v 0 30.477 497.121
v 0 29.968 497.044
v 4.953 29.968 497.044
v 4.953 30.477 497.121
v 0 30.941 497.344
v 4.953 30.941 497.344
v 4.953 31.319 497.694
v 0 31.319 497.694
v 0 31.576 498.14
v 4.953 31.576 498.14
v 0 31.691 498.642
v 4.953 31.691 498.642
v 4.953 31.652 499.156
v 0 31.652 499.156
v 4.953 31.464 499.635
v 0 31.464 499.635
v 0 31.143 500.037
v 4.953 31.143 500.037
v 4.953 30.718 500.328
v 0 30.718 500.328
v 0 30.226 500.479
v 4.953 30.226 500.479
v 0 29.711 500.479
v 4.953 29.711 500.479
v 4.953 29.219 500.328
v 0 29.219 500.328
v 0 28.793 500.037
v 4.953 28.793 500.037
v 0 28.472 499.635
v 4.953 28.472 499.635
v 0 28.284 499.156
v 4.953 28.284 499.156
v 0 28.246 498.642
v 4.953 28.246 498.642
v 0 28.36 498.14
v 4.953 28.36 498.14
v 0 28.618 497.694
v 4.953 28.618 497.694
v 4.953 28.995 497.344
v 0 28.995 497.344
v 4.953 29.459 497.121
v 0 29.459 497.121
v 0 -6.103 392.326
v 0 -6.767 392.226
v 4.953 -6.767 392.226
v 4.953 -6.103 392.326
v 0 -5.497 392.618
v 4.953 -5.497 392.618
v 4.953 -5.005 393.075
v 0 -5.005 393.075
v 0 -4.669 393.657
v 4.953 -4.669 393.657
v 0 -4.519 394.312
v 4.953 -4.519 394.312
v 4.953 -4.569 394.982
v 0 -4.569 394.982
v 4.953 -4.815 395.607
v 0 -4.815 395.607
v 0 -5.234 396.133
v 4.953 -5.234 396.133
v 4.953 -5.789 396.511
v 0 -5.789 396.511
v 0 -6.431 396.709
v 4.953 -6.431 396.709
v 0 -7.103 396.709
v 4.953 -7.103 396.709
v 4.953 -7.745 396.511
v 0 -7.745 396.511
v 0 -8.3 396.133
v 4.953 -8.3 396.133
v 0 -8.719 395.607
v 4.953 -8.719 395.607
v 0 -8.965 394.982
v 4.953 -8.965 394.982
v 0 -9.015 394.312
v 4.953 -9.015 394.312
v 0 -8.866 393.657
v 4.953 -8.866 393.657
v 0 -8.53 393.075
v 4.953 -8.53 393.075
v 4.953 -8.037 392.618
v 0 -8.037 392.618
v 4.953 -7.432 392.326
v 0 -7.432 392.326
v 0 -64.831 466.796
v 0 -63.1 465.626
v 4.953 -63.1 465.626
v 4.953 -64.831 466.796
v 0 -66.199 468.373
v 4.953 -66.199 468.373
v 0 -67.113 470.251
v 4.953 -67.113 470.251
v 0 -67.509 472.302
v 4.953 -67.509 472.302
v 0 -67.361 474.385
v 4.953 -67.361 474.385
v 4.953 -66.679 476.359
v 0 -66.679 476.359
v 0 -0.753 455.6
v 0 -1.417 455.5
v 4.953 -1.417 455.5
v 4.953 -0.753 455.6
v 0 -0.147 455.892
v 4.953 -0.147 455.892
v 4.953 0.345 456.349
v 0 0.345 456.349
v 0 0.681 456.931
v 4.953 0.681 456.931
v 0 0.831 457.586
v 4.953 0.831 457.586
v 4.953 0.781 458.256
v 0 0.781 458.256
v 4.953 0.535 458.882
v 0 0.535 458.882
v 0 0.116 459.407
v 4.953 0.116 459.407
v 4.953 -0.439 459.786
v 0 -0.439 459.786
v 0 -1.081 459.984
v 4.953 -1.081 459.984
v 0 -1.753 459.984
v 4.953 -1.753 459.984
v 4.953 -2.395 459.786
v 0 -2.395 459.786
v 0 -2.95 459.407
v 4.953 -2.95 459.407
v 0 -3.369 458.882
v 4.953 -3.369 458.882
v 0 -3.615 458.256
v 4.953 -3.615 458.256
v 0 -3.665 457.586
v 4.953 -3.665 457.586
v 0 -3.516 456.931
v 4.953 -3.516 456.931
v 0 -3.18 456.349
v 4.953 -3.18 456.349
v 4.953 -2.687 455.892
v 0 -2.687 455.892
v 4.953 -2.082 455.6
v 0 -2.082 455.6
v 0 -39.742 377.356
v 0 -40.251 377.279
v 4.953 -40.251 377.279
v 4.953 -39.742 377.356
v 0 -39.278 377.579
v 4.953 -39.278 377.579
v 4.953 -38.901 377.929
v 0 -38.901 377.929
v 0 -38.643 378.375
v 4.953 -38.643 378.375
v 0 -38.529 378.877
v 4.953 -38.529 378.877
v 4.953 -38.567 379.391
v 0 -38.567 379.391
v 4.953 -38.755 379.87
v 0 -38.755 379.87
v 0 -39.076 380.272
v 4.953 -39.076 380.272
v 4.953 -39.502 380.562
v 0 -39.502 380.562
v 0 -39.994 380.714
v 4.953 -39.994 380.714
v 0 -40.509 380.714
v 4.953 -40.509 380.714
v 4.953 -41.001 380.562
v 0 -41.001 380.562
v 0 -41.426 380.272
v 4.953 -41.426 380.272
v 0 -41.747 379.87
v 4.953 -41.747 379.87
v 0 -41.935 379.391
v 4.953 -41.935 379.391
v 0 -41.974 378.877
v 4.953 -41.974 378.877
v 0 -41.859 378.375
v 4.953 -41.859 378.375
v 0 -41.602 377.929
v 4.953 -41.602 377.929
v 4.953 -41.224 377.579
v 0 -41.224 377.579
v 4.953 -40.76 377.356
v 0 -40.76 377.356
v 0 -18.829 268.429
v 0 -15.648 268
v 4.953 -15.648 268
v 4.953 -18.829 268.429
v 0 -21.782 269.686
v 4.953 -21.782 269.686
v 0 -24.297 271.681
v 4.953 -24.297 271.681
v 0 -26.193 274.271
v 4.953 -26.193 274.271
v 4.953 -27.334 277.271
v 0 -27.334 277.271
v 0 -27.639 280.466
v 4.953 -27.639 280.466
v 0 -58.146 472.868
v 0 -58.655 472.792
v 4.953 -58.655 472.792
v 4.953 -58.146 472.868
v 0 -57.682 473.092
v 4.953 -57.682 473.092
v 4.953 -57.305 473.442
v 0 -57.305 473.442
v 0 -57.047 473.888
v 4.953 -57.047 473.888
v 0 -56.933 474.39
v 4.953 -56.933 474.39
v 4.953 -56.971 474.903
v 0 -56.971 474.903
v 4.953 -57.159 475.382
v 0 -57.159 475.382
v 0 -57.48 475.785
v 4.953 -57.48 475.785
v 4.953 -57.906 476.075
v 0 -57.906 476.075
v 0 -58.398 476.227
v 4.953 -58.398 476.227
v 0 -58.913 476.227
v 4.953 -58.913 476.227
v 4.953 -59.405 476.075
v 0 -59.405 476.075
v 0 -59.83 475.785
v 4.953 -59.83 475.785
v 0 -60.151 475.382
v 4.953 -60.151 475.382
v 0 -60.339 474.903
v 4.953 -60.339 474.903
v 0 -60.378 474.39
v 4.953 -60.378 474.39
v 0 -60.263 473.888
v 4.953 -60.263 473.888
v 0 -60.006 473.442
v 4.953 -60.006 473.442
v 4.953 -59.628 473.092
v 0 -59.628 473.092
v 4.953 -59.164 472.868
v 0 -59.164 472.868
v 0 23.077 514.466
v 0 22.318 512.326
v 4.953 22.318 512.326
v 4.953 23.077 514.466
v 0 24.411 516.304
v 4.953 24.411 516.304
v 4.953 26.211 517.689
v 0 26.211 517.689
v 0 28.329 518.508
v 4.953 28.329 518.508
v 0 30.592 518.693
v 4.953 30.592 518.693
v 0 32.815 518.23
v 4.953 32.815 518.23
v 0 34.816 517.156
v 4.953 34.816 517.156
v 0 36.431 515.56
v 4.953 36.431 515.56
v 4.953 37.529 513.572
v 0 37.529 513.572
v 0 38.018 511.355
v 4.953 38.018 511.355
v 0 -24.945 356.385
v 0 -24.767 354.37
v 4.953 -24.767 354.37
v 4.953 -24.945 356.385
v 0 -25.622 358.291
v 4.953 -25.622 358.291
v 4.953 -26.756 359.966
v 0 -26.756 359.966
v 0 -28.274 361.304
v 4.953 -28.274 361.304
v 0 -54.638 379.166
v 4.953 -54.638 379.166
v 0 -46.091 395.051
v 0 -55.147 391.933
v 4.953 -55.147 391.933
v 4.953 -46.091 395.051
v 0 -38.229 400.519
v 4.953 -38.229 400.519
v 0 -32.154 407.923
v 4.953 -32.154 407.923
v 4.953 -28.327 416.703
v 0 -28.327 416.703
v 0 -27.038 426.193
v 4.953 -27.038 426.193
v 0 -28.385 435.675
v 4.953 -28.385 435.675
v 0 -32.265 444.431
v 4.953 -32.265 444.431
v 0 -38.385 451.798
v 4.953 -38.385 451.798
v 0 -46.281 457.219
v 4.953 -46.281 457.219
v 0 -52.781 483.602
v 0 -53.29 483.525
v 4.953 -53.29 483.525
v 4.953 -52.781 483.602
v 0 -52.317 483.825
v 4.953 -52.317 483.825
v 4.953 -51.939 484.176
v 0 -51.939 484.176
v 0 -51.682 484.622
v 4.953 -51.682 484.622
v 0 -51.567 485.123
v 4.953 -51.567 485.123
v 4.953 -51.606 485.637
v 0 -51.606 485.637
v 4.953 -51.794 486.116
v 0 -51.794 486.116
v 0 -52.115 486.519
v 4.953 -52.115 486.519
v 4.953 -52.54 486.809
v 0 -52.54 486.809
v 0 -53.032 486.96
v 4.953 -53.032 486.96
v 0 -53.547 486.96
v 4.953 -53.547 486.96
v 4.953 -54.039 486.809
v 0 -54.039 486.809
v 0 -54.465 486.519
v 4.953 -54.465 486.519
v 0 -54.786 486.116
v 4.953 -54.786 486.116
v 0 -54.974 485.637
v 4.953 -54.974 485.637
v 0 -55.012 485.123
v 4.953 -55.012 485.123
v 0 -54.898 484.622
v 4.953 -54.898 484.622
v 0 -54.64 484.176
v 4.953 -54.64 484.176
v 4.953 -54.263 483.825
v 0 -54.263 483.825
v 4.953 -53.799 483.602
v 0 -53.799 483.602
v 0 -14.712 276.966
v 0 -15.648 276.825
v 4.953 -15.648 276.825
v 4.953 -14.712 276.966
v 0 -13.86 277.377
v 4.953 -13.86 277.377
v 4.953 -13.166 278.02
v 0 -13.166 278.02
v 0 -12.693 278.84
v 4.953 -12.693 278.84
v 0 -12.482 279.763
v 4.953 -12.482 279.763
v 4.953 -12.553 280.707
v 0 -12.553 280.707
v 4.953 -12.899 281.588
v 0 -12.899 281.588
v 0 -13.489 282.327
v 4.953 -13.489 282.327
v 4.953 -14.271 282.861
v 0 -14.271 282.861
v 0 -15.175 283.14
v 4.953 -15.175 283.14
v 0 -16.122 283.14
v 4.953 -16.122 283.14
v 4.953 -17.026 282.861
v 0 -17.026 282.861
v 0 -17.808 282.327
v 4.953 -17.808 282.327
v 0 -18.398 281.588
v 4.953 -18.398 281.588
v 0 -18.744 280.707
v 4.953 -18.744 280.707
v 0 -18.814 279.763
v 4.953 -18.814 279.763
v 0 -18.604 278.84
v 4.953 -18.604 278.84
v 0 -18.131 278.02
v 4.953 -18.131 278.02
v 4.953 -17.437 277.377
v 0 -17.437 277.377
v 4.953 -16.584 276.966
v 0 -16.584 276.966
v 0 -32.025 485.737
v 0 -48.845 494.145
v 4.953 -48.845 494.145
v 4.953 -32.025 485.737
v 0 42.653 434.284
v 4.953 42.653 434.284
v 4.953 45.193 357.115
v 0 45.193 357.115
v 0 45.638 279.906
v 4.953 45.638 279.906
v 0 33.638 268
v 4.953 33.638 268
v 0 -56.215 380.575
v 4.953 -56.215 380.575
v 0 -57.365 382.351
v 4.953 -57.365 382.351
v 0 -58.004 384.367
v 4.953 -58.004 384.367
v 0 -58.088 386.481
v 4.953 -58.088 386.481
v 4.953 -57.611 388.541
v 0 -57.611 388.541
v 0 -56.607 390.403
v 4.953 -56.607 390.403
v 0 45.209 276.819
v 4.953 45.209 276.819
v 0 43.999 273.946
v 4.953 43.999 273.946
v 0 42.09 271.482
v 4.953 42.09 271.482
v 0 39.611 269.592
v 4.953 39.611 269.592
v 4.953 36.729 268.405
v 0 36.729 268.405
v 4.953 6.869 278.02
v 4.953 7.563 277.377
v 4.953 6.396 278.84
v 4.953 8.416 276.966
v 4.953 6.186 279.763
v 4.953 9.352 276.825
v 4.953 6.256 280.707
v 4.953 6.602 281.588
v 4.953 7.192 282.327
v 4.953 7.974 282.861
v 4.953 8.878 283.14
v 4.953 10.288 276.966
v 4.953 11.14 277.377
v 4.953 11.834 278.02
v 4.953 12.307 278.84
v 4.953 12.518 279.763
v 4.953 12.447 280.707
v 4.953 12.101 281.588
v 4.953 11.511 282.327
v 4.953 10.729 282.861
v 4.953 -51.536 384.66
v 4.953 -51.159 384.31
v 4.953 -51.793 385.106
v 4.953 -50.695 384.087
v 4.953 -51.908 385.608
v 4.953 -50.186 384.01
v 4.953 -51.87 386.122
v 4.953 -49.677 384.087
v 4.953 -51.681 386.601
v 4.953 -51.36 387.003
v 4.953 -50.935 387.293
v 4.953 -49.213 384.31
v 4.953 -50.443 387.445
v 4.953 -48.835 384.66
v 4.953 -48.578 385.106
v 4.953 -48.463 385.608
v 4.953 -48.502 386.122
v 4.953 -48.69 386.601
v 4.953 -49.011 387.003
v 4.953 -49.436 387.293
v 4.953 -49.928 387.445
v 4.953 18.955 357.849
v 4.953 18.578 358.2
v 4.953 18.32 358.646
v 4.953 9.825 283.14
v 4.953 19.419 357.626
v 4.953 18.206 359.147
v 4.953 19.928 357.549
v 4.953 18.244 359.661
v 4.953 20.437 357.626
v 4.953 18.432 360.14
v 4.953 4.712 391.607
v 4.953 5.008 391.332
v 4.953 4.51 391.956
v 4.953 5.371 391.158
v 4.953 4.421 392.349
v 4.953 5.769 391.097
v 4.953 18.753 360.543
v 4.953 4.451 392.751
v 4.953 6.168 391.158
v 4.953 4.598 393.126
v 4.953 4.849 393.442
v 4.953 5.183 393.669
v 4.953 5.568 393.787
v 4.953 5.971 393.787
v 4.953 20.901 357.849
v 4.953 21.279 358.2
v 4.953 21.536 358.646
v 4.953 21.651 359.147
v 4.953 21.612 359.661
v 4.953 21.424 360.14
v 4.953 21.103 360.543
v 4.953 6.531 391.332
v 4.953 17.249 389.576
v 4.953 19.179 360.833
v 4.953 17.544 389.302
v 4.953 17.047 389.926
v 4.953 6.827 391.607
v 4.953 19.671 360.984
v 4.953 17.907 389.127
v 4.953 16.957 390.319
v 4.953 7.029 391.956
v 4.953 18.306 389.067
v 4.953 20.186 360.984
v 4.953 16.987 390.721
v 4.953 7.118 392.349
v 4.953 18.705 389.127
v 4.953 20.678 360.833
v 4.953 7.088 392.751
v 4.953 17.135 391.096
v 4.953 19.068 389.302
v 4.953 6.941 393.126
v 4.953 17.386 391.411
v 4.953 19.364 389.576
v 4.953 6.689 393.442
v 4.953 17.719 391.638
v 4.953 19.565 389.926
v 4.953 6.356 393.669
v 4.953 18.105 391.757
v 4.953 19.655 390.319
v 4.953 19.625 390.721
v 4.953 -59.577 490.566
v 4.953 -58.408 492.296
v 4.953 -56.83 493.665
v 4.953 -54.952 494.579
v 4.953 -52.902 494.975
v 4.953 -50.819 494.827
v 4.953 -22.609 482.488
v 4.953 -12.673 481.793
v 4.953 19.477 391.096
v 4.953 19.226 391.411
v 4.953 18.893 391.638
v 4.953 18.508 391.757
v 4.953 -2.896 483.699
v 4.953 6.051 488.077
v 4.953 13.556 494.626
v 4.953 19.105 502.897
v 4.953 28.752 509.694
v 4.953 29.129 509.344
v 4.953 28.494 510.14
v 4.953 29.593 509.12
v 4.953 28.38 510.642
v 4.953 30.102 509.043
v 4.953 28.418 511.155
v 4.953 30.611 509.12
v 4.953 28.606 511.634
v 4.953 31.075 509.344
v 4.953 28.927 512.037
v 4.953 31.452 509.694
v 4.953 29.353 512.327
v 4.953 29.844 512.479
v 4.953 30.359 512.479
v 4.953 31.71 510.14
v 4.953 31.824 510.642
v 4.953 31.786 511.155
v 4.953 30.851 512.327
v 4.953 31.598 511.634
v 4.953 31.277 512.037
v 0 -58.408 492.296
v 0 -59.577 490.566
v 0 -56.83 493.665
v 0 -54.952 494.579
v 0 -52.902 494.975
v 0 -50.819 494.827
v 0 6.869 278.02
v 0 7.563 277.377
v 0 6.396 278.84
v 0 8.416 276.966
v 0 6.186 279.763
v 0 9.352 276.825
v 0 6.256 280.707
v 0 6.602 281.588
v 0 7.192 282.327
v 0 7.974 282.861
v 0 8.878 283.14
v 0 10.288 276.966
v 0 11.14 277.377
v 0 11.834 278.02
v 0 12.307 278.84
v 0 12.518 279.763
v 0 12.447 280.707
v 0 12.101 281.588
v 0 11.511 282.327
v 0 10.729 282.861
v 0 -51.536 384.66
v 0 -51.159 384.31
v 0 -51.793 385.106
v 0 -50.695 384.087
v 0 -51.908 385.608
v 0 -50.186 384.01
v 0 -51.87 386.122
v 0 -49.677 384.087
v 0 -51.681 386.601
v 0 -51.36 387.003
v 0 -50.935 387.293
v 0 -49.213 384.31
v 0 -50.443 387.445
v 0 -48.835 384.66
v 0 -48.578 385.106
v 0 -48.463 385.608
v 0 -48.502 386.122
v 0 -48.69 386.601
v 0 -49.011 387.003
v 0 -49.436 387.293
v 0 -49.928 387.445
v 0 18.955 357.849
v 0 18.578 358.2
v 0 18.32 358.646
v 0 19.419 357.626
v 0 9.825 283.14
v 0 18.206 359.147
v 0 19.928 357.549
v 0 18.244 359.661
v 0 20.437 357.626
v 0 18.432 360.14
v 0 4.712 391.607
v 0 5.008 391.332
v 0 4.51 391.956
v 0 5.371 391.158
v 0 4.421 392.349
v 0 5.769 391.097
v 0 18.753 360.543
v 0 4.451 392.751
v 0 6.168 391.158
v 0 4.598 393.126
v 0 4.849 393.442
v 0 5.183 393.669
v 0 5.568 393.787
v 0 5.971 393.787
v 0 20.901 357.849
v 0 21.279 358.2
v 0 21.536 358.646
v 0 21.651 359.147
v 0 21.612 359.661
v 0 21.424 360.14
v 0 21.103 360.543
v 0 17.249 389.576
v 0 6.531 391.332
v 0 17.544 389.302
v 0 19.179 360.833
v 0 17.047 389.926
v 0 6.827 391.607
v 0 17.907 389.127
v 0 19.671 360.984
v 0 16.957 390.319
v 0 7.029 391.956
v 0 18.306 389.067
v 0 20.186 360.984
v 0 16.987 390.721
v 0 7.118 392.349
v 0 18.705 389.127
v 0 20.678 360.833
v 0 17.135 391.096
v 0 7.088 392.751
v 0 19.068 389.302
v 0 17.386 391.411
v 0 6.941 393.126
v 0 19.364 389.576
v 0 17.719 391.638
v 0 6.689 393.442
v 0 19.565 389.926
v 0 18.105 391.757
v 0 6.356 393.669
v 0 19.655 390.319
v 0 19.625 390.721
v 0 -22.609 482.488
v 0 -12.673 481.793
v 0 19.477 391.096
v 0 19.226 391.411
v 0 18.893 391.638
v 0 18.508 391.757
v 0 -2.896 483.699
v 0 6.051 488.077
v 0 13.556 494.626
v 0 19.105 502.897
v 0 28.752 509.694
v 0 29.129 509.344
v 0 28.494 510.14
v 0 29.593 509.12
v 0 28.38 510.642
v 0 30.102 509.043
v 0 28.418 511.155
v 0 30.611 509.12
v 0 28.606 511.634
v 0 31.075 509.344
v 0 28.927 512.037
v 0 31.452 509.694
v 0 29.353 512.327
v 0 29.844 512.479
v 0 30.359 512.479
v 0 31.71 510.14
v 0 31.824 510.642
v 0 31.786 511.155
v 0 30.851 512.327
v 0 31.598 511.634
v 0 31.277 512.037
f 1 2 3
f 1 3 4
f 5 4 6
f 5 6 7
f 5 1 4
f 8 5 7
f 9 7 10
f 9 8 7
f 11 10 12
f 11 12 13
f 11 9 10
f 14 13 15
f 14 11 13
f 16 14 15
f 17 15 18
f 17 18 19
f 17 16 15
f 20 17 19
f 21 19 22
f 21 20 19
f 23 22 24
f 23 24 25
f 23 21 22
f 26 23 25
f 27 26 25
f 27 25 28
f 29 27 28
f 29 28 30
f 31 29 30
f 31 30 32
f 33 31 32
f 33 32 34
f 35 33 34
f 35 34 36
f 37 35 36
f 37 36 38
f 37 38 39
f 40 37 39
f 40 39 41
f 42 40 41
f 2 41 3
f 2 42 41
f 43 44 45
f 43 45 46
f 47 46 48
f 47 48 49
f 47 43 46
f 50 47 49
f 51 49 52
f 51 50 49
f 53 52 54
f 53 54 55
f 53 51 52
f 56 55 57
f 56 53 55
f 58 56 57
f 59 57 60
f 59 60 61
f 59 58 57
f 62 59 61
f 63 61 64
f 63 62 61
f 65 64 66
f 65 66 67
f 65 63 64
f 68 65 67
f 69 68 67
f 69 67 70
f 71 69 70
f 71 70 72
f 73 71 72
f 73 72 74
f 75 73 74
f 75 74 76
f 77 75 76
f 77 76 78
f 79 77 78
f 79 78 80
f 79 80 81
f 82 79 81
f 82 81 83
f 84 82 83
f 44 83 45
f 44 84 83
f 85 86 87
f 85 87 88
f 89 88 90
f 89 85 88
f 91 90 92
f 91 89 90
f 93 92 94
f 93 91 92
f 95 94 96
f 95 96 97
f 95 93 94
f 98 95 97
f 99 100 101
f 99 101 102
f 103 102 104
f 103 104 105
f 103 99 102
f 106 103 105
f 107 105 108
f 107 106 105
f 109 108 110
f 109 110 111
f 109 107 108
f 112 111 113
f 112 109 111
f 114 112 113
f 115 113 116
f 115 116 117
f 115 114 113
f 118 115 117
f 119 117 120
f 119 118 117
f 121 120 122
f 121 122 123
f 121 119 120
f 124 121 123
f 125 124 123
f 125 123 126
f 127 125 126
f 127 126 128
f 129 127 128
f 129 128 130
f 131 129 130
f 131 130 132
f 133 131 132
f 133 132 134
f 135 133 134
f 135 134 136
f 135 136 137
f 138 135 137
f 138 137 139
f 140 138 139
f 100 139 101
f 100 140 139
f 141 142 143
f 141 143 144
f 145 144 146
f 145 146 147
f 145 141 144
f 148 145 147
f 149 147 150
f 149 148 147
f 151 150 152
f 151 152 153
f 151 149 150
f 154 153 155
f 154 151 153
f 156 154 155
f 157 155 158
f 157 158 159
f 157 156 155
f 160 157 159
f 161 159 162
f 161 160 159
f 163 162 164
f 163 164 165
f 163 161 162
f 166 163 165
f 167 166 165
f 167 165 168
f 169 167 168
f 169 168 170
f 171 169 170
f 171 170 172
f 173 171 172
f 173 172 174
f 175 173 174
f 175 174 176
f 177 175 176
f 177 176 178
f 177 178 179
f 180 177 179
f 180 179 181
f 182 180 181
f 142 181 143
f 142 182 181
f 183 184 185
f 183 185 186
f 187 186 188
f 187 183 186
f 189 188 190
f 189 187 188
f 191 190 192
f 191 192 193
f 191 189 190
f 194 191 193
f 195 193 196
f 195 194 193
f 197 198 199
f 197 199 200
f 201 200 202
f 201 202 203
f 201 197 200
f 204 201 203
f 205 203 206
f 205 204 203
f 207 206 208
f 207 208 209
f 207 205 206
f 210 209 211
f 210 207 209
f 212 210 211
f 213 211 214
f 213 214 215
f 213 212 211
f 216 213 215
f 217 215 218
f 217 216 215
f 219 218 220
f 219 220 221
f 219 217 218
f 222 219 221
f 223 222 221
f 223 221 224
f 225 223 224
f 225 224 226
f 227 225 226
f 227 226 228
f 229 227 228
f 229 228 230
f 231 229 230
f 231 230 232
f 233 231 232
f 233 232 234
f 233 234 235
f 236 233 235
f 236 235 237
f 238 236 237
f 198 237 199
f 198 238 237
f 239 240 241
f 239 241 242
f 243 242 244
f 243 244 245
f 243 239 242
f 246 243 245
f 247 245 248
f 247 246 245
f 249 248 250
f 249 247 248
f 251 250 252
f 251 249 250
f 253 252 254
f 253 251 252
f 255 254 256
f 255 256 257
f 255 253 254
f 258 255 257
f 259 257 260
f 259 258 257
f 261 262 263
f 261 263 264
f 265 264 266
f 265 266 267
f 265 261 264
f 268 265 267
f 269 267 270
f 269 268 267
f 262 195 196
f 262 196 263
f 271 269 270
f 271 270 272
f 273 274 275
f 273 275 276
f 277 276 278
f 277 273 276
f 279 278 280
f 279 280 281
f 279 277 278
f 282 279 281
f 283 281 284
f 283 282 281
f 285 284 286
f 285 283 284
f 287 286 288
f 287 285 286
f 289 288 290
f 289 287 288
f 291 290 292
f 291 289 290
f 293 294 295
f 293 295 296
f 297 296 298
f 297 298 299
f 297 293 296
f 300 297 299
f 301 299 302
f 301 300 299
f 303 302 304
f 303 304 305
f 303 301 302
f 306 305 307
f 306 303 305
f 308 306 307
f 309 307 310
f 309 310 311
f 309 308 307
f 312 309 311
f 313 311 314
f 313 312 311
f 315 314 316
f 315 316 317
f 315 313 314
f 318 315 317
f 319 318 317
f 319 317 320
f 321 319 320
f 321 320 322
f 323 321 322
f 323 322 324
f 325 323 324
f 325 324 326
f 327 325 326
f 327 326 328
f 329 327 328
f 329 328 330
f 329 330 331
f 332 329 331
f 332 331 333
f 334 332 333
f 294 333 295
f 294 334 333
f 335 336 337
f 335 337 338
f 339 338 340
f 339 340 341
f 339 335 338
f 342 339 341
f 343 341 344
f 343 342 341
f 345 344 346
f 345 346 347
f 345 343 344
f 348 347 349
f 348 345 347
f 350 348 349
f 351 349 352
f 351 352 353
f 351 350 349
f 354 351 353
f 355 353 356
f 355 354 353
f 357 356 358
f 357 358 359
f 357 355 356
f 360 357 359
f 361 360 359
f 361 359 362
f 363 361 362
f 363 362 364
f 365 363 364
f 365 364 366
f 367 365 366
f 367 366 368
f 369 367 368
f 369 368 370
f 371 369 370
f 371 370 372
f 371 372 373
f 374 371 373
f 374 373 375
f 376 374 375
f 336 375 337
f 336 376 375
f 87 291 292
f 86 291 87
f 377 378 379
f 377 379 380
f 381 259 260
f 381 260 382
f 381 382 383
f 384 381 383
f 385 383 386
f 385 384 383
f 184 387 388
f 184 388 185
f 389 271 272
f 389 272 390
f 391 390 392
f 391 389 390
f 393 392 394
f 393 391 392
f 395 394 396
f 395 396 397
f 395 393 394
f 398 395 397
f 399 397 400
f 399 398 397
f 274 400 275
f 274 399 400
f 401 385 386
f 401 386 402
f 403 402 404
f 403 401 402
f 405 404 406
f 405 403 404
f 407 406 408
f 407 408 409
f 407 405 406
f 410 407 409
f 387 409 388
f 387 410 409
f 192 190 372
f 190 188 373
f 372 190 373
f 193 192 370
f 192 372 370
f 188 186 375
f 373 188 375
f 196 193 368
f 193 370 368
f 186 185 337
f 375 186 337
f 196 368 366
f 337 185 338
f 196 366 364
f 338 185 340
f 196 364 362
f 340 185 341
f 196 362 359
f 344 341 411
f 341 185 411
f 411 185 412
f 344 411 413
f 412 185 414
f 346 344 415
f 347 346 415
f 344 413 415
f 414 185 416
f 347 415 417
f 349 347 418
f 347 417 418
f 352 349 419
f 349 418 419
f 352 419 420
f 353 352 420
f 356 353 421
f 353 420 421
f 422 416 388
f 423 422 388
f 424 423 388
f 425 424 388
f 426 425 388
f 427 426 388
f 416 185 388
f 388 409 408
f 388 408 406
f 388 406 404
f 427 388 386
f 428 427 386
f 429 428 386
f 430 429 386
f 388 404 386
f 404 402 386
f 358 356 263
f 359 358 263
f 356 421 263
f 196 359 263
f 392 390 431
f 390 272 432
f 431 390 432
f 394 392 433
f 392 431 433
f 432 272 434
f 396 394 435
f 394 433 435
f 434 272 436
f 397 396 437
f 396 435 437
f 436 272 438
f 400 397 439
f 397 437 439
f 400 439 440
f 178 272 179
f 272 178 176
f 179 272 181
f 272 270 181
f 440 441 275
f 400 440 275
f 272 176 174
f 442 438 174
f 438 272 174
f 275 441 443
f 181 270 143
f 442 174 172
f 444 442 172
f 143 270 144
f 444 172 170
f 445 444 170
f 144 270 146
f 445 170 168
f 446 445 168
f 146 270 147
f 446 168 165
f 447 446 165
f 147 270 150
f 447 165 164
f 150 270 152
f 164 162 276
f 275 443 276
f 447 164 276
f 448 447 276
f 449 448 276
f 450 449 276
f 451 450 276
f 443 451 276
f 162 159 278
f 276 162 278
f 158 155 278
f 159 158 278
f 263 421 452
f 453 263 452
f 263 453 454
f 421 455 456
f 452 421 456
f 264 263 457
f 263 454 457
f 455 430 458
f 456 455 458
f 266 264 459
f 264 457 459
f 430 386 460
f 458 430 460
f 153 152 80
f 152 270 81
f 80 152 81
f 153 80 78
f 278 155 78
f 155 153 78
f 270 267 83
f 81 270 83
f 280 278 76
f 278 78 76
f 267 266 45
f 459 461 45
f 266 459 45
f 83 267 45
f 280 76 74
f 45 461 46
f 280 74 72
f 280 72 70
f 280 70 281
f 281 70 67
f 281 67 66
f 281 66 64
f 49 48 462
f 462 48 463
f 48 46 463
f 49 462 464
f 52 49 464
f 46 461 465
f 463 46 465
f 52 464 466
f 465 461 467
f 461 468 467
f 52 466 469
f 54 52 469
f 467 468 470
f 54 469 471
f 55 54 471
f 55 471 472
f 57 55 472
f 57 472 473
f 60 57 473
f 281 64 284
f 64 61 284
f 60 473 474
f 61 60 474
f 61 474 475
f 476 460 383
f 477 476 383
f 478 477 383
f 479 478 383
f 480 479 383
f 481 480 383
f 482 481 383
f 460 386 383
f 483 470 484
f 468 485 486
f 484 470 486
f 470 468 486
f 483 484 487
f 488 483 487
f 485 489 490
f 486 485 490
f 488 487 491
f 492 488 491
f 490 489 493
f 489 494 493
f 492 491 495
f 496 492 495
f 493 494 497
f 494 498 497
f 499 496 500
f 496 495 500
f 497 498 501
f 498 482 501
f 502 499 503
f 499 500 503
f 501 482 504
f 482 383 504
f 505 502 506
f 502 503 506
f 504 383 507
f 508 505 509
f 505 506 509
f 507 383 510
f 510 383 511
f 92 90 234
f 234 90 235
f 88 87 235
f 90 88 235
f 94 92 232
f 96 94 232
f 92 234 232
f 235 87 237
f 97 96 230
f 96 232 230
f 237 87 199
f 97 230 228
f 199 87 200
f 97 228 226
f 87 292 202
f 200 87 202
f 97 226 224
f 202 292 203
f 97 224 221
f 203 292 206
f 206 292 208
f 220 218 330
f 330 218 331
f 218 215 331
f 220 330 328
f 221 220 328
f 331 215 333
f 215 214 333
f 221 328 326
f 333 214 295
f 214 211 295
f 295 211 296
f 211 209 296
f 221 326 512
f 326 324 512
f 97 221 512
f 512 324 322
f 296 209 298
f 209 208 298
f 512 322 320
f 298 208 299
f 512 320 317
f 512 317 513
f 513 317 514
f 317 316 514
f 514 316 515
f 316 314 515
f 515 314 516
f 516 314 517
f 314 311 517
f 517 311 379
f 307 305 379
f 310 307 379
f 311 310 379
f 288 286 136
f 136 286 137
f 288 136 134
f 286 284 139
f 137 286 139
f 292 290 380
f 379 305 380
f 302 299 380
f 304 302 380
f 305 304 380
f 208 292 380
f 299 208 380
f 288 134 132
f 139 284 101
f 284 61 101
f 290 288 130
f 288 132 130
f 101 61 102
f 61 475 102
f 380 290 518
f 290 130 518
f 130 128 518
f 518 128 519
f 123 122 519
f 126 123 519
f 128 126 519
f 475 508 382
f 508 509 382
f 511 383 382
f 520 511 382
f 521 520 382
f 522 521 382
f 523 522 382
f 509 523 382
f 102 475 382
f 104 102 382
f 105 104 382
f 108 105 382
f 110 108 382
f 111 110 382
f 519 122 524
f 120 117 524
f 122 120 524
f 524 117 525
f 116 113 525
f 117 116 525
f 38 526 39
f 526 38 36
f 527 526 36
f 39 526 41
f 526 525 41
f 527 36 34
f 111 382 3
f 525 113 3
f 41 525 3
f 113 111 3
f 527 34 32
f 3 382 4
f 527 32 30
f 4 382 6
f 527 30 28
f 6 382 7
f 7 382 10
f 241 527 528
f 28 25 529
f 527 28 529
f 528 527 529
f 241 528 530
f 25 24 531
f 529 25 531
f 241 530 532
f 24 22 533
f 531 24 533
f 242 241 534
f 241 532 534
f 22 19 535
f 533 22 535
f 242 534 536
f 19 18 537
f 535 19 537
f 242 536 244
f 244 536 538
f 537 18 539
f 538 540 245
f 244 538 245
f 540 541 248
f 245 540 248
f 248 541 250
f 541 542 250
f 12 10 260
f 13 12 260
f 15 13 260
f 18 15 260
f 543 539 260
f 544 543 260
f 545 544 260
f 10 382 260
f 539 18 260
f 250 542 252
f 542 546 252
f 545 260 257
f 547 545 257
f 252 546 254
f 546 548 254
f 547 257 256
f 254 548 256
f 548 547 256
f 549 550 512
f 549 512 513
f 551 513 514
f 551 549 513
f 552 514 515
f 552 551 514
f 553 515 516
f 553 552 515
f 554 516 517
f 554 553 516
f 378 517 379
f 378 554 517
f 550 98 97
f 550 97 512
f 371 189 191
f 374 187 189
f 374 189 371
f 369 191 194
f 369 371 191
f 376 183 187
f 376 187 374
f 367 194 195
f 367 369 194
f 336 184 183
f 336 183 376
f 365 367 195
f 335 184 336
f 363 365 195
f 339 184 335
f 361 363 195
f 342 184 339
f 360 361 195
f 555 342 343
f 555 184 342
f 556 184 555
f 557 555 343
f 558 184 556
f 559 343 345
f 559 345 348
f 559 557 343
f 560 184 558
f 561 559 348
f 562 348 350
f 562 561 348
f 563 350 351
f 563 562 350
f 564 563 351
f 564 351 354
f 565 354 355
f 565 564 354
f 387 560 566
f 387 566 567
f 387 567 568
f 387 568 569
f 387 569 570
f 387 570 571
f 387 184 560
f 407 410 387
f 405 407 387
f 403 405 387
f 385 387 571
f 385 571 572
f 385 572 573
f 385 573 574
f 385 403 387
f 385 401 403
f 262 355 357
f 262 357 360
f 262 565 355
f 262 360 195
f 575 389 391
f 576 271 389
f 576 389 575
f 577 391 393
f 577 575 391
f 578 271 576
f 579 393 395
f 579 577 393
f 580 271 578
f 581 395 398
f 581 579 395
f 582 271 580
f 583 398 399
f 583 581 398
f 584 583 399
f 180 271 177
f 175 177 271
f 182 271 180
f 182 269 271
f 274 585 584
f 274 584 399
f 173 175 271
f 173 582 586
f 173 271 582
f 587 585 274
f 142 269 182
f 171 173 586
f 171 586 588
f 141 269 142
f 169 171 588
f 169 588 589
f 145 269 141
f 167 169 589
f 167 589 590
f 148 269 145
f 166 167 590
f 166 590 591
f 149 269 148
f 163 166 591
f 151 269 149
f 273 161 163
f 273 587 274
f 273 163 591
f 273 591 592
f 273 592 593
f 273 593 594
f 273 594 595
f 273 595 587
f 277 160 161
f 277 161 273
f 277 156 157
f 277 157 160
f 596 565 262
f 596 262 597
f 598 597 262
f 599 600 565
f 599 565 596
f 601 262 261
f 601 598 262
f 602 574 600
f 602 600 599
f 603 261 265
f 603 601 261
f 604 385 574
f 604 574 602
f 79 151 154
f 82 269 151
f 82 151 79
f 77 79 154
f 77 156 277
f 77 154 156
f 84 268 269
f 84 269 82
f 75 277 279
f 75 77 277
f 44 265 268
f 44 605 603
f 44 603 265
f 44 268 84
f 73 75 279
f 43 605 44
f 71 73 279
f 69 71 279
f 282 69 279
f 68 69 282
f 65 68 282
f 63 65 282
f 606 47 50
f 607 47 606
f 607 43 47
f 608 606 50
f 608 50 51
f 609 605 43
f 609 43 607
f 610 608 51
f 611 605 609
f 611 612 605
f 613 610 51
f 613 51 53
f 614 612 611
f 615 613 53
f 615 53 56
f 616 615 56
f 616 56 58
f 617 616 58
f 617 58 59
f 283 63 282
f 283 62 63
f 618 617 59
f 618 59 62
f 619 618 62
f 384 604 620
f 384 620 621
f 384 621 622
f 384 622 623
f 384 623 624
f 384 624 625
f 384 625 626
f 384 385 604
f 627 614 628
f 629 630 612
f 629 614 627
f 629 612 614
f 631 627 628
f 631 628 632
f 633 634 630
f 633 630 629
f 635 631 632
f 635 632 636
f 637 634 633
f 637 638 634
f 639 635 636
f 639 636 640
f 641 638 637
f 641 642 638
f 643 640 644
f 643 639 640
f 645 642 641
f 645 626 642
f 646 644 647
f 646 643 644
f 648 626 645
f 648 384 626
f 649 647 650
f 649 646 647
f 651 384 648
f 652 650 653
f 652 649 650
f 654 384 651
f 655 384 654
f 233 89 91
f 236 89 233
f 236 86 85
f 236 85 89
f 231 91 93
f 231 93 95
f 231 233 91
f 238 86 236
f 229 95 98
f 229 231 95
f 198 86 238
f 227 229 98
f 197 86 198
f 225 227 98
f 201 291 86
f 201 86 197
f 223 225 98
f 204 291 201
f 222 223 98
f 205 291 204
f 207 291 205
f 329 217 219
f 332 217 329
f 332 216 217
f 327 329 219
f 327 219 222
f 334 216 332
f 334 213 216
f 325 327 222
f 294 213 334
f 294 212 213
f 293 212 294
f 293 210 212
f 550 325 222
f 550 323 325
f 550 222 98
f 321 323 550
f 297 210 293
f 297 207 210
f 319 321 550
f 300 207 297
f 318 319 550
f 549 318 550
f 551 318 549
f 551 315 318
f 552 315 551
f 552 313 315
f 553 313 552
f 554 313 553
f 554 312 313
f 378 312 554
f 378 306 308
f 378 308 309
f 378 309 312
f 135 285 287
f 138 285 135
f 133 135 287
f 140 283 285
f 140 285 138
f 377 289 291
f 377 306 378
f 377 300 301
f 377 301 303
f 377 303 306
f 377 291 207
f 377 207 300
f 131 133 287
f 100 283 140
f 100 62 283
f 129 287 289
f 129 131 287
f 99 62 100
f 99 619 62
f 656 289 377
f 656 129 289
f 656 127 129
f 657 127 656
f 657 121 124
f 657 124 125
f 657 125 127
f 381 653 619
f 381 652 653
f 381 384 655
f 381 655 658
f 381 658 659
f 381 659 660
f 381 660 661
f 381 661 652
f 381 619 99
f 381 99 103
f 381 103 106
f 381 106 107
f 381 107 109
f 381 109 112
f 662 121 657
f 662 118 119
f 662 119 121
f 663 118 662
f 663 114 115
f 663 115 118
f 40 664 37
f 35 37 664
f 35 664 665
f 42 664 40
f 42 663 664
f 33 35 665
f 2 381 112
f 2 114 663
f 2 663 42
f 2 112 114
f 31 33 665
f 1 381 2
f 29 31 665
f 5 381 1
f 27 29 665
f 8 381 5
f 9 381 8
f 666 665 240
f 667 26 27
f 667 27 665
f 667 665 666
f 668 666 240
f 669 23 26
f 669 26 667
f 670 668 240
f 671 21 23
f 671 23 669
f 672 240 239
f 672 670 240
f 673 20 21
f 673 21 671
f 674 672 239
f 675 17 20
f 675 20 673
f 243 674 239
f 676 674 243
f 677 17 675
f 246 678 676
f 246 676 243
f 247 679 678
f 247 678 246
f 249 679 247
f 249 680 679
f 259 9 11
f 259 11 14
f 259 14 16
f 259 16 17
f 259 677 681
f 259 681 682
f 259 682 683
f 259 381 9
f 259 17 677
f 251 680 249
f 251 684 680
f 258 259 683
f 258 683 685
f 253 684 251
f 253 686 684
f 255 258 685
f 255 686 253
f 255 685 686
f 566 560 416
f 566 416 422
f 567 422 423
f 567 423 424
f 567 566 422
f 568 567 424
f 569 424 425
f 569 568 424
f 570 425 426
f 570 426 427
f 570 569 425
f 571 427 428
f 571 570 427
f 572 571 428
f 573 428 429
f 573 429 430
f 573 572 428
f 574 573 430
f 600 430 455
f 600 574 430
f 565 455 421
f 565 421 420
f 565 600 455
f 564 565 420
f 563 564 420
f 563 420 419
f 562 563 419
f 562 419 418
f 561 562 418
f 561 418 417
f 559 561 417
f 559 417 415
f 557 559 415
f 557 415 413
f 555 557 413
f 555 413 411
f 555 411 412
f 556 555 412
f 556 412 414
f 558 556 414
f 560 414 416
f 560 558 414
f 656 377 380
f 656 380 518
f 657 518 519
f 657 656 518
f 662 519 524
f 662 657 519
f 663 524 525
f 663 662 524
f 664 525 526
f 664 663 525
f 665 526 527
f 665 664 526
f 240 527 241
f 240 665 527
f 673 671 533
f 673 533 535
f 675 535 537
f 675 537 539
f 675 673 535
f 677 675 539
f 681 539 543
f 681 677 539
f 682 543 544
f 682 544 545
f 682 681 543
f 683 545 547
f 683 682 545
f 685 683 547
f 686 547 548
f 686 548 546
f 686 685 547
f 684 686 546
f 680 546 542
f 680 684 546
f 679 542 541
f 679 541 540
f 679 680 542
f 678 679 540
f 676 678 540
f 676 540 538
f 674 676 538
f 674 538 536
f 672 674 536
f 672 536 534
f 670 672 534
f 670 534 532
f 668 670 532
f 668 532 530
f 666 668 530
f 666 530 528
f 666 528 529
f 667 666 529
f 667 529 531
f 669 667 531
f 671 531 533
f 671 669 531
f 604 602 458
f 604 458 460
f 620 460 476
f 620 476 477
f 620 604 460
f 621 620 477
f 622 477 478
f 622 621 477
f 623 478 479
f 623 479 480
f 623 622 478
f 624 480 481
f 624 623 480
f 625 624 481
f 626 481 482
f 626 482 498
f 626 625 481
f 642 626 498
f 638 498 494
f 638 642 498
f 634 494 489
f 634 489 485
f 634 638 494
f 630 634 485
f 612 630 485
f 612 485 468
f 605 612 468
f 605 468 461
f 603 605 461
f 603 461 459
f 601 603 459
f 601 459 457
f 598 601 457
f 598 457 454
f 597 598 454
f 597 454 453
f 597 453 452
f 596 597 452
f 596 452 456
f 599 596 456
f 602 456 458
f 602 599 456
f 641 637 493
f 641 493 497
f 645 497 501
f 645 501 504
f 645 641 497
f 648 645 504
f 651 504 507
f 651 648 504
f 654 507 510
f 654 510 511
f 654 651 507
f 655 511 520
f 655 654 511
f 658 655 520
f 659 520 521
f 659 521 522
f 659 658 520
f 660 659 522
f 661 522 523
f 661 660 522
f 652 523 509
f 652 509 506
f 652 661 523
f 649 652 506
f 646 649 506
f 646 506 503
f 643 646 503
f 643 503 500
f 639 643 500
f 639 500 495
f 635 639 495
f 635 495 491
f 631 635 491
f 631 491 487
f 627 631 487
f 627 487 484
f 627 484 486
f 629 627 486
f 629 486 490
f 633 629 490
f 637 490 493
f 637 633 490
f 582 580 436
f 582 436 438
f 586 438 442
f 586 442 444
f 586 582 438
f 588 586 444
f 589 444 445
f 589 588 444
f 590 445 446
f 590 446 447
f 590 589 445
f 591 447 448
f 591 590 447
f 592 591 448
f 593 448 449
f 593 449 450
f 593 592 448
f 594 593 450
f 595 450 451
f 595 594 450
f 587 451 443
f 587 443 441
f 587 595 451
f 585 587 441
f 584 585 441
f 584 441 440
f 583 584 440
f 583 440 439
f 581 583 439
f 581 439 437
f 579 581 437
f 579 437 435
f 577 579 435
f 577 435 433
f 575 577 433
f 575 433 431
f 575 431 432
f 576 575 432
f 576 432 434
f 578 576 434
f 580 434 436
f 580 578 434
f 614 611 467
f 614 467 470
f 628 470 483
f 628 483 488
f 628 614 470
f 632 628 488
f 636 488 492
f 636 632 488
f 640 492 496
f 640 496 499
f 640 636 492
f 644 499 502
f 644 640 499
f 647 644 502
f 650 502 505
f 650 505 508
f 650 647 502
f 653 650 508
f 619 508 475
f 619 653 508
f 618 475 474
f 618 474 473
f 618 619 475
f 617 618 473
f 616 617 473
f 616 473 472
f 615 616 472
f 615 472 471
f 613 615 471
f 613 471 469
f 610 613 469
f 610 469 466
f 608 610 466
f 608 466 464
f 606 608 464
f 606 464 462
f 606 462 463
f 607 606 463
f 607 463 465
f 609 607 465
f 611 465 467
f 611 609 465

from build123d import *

# Parameters (mm, degrees)
SKETCH2_R           = 1.7272
SKETCH2_R_2         = 2.25425
SKETCH2_R_3         = 1.352550022
SKETCH2_R_4         = 3.175
BOSS_EXTRUDE1_DEPTH = 4.953


with BuildPart() as part:
    # Sketch2 → Boss-Extrude1 (new body)
    with BuildSketch(Plane(origin=(0, 0, 0), x_dir=(0, 0, -1), z_dir=(1, 0, 0))):
        with BuildLine():
            Line((-268, 33.638045694), (-268, -15.648345659))
            ThreePointArc((-268, -15.648345659), (-271.681104191, -24.296812143), (-280.46599542, -27.639294256))
            Line((-280.46599542, -27.639294256), (-354.369890721, -24.767221505))
            ThreePointArc((-354.369890721, -24.767221505), (-358.291047411, -25.622255962), (-361.303569715, -28.273908856))
            Line((-361.303569715, -28.273908856), (-379.165898581, -54.637880239))
            ThreePointArc((-379.165898581, -54.637880239), (-385.420991101, -58.116858889), (-391.93317504, -55.146852962))
            ThreePointArc((-391.93317504, -55.146852962), (-421.403553341, -27.354673474), (-457.218589828, -46.280623895))
            Line((-457.218589828, -46.280623895), (-465.626255558, -63.10041384))
            ThreePointArc((-465.626255558, -63.10041384), (-470.251425545, -67.112661913), (-476.359002427, -66.679260672))
            Line((-476.359002427, -66.679260672), (-490.566300389, -59.577494681))
            ThreePointArc((-490.566300389, -59.577494681), (-494.578548462, -54.952324694), (-494.145147221, -48.844747812))
            Line((-494.145147221, -48.844747812), (-485.73748149, -32.024957868))
            ThreePointArc((-485.73748149, -32.024957868), (-485.593767218, 1.721364638), (-512.325819935, 22.318264742))
            ThreePointArc((-512.325819935, 22.318264742), (-518.692977578, 30.592013537), (-511.35460422, 38.017906886))
            ThreePointArc((-511.35460422, 38.017906886), (-395.707987807, 44.184774715), (-279.906177735, 45.637678913))
            ThreePointArc((-279.906177735, 45.637678913), (-271.481612031, 42.090090796), (-268, 33.638045694))
        make_face()
        with Locations((-379.006254083, -40.251135649)):
            Circle(SKETCH2_R, mode=Mode.SUBTRACT)
        with Locations((-510.7706223, 30.101918548)):
            Circle(SKETCH2_R, mode=Mode.SUBTRACT)
        with Locations((-457.75455229, -1.41718755)):
            Circle(SKETCH2_R_2, mode=Mode.SUBTRACT)
        with Locations((-394.480328138, -6.767192974)):
            Circle(SKETCH2_R_2, mode=Mode.SUBTRACT)
        with Locations((-359.276554144, 19.928216477)):
            Circle(SKETCH2_R, mode=Mode.SUBTRACT)
        with Locations((-385.737171654, -50.185658721)):
            Circle(SKETCH2_R, mode=Mode.SUBTRACT)
        with Locations((-390.419716853, 18.306128226)):
            Circle(SKETCH2_R_3, mode=Mode.SUBTRACT)
        with Locations((-392.450022496, 5.769467626)):
            Circle(SKETCH2_R_3, mode=Mode.SUBTRACT)
        with Locations((-498.771367049, 29.968227033)):
            Circle(SKETCH2_R, mode=Mode.SUBTRACT)
        with Locations((-474.518853752, -58.65529334)):
            Circle(SKETCH2_R, mode=Mode.SUBTRACT)
        with Locations((-485.252549027, -53.289868312)):
            Circle(SKETCH2_R, mode=Mode.SUBTRACT)
        with Locations((-280, -15.648345659)):
            Circle(SKETCH2_R_4, mode=Mode.SUBTRACT)
        with Locations((-280, 9.351654341)):
            Circle(SKETCH2_R_4, mode=Mode.SUBTRACT)
    extrude(amount=BOSS_EXTRUDE1_DEPTH)


solid = part.part
